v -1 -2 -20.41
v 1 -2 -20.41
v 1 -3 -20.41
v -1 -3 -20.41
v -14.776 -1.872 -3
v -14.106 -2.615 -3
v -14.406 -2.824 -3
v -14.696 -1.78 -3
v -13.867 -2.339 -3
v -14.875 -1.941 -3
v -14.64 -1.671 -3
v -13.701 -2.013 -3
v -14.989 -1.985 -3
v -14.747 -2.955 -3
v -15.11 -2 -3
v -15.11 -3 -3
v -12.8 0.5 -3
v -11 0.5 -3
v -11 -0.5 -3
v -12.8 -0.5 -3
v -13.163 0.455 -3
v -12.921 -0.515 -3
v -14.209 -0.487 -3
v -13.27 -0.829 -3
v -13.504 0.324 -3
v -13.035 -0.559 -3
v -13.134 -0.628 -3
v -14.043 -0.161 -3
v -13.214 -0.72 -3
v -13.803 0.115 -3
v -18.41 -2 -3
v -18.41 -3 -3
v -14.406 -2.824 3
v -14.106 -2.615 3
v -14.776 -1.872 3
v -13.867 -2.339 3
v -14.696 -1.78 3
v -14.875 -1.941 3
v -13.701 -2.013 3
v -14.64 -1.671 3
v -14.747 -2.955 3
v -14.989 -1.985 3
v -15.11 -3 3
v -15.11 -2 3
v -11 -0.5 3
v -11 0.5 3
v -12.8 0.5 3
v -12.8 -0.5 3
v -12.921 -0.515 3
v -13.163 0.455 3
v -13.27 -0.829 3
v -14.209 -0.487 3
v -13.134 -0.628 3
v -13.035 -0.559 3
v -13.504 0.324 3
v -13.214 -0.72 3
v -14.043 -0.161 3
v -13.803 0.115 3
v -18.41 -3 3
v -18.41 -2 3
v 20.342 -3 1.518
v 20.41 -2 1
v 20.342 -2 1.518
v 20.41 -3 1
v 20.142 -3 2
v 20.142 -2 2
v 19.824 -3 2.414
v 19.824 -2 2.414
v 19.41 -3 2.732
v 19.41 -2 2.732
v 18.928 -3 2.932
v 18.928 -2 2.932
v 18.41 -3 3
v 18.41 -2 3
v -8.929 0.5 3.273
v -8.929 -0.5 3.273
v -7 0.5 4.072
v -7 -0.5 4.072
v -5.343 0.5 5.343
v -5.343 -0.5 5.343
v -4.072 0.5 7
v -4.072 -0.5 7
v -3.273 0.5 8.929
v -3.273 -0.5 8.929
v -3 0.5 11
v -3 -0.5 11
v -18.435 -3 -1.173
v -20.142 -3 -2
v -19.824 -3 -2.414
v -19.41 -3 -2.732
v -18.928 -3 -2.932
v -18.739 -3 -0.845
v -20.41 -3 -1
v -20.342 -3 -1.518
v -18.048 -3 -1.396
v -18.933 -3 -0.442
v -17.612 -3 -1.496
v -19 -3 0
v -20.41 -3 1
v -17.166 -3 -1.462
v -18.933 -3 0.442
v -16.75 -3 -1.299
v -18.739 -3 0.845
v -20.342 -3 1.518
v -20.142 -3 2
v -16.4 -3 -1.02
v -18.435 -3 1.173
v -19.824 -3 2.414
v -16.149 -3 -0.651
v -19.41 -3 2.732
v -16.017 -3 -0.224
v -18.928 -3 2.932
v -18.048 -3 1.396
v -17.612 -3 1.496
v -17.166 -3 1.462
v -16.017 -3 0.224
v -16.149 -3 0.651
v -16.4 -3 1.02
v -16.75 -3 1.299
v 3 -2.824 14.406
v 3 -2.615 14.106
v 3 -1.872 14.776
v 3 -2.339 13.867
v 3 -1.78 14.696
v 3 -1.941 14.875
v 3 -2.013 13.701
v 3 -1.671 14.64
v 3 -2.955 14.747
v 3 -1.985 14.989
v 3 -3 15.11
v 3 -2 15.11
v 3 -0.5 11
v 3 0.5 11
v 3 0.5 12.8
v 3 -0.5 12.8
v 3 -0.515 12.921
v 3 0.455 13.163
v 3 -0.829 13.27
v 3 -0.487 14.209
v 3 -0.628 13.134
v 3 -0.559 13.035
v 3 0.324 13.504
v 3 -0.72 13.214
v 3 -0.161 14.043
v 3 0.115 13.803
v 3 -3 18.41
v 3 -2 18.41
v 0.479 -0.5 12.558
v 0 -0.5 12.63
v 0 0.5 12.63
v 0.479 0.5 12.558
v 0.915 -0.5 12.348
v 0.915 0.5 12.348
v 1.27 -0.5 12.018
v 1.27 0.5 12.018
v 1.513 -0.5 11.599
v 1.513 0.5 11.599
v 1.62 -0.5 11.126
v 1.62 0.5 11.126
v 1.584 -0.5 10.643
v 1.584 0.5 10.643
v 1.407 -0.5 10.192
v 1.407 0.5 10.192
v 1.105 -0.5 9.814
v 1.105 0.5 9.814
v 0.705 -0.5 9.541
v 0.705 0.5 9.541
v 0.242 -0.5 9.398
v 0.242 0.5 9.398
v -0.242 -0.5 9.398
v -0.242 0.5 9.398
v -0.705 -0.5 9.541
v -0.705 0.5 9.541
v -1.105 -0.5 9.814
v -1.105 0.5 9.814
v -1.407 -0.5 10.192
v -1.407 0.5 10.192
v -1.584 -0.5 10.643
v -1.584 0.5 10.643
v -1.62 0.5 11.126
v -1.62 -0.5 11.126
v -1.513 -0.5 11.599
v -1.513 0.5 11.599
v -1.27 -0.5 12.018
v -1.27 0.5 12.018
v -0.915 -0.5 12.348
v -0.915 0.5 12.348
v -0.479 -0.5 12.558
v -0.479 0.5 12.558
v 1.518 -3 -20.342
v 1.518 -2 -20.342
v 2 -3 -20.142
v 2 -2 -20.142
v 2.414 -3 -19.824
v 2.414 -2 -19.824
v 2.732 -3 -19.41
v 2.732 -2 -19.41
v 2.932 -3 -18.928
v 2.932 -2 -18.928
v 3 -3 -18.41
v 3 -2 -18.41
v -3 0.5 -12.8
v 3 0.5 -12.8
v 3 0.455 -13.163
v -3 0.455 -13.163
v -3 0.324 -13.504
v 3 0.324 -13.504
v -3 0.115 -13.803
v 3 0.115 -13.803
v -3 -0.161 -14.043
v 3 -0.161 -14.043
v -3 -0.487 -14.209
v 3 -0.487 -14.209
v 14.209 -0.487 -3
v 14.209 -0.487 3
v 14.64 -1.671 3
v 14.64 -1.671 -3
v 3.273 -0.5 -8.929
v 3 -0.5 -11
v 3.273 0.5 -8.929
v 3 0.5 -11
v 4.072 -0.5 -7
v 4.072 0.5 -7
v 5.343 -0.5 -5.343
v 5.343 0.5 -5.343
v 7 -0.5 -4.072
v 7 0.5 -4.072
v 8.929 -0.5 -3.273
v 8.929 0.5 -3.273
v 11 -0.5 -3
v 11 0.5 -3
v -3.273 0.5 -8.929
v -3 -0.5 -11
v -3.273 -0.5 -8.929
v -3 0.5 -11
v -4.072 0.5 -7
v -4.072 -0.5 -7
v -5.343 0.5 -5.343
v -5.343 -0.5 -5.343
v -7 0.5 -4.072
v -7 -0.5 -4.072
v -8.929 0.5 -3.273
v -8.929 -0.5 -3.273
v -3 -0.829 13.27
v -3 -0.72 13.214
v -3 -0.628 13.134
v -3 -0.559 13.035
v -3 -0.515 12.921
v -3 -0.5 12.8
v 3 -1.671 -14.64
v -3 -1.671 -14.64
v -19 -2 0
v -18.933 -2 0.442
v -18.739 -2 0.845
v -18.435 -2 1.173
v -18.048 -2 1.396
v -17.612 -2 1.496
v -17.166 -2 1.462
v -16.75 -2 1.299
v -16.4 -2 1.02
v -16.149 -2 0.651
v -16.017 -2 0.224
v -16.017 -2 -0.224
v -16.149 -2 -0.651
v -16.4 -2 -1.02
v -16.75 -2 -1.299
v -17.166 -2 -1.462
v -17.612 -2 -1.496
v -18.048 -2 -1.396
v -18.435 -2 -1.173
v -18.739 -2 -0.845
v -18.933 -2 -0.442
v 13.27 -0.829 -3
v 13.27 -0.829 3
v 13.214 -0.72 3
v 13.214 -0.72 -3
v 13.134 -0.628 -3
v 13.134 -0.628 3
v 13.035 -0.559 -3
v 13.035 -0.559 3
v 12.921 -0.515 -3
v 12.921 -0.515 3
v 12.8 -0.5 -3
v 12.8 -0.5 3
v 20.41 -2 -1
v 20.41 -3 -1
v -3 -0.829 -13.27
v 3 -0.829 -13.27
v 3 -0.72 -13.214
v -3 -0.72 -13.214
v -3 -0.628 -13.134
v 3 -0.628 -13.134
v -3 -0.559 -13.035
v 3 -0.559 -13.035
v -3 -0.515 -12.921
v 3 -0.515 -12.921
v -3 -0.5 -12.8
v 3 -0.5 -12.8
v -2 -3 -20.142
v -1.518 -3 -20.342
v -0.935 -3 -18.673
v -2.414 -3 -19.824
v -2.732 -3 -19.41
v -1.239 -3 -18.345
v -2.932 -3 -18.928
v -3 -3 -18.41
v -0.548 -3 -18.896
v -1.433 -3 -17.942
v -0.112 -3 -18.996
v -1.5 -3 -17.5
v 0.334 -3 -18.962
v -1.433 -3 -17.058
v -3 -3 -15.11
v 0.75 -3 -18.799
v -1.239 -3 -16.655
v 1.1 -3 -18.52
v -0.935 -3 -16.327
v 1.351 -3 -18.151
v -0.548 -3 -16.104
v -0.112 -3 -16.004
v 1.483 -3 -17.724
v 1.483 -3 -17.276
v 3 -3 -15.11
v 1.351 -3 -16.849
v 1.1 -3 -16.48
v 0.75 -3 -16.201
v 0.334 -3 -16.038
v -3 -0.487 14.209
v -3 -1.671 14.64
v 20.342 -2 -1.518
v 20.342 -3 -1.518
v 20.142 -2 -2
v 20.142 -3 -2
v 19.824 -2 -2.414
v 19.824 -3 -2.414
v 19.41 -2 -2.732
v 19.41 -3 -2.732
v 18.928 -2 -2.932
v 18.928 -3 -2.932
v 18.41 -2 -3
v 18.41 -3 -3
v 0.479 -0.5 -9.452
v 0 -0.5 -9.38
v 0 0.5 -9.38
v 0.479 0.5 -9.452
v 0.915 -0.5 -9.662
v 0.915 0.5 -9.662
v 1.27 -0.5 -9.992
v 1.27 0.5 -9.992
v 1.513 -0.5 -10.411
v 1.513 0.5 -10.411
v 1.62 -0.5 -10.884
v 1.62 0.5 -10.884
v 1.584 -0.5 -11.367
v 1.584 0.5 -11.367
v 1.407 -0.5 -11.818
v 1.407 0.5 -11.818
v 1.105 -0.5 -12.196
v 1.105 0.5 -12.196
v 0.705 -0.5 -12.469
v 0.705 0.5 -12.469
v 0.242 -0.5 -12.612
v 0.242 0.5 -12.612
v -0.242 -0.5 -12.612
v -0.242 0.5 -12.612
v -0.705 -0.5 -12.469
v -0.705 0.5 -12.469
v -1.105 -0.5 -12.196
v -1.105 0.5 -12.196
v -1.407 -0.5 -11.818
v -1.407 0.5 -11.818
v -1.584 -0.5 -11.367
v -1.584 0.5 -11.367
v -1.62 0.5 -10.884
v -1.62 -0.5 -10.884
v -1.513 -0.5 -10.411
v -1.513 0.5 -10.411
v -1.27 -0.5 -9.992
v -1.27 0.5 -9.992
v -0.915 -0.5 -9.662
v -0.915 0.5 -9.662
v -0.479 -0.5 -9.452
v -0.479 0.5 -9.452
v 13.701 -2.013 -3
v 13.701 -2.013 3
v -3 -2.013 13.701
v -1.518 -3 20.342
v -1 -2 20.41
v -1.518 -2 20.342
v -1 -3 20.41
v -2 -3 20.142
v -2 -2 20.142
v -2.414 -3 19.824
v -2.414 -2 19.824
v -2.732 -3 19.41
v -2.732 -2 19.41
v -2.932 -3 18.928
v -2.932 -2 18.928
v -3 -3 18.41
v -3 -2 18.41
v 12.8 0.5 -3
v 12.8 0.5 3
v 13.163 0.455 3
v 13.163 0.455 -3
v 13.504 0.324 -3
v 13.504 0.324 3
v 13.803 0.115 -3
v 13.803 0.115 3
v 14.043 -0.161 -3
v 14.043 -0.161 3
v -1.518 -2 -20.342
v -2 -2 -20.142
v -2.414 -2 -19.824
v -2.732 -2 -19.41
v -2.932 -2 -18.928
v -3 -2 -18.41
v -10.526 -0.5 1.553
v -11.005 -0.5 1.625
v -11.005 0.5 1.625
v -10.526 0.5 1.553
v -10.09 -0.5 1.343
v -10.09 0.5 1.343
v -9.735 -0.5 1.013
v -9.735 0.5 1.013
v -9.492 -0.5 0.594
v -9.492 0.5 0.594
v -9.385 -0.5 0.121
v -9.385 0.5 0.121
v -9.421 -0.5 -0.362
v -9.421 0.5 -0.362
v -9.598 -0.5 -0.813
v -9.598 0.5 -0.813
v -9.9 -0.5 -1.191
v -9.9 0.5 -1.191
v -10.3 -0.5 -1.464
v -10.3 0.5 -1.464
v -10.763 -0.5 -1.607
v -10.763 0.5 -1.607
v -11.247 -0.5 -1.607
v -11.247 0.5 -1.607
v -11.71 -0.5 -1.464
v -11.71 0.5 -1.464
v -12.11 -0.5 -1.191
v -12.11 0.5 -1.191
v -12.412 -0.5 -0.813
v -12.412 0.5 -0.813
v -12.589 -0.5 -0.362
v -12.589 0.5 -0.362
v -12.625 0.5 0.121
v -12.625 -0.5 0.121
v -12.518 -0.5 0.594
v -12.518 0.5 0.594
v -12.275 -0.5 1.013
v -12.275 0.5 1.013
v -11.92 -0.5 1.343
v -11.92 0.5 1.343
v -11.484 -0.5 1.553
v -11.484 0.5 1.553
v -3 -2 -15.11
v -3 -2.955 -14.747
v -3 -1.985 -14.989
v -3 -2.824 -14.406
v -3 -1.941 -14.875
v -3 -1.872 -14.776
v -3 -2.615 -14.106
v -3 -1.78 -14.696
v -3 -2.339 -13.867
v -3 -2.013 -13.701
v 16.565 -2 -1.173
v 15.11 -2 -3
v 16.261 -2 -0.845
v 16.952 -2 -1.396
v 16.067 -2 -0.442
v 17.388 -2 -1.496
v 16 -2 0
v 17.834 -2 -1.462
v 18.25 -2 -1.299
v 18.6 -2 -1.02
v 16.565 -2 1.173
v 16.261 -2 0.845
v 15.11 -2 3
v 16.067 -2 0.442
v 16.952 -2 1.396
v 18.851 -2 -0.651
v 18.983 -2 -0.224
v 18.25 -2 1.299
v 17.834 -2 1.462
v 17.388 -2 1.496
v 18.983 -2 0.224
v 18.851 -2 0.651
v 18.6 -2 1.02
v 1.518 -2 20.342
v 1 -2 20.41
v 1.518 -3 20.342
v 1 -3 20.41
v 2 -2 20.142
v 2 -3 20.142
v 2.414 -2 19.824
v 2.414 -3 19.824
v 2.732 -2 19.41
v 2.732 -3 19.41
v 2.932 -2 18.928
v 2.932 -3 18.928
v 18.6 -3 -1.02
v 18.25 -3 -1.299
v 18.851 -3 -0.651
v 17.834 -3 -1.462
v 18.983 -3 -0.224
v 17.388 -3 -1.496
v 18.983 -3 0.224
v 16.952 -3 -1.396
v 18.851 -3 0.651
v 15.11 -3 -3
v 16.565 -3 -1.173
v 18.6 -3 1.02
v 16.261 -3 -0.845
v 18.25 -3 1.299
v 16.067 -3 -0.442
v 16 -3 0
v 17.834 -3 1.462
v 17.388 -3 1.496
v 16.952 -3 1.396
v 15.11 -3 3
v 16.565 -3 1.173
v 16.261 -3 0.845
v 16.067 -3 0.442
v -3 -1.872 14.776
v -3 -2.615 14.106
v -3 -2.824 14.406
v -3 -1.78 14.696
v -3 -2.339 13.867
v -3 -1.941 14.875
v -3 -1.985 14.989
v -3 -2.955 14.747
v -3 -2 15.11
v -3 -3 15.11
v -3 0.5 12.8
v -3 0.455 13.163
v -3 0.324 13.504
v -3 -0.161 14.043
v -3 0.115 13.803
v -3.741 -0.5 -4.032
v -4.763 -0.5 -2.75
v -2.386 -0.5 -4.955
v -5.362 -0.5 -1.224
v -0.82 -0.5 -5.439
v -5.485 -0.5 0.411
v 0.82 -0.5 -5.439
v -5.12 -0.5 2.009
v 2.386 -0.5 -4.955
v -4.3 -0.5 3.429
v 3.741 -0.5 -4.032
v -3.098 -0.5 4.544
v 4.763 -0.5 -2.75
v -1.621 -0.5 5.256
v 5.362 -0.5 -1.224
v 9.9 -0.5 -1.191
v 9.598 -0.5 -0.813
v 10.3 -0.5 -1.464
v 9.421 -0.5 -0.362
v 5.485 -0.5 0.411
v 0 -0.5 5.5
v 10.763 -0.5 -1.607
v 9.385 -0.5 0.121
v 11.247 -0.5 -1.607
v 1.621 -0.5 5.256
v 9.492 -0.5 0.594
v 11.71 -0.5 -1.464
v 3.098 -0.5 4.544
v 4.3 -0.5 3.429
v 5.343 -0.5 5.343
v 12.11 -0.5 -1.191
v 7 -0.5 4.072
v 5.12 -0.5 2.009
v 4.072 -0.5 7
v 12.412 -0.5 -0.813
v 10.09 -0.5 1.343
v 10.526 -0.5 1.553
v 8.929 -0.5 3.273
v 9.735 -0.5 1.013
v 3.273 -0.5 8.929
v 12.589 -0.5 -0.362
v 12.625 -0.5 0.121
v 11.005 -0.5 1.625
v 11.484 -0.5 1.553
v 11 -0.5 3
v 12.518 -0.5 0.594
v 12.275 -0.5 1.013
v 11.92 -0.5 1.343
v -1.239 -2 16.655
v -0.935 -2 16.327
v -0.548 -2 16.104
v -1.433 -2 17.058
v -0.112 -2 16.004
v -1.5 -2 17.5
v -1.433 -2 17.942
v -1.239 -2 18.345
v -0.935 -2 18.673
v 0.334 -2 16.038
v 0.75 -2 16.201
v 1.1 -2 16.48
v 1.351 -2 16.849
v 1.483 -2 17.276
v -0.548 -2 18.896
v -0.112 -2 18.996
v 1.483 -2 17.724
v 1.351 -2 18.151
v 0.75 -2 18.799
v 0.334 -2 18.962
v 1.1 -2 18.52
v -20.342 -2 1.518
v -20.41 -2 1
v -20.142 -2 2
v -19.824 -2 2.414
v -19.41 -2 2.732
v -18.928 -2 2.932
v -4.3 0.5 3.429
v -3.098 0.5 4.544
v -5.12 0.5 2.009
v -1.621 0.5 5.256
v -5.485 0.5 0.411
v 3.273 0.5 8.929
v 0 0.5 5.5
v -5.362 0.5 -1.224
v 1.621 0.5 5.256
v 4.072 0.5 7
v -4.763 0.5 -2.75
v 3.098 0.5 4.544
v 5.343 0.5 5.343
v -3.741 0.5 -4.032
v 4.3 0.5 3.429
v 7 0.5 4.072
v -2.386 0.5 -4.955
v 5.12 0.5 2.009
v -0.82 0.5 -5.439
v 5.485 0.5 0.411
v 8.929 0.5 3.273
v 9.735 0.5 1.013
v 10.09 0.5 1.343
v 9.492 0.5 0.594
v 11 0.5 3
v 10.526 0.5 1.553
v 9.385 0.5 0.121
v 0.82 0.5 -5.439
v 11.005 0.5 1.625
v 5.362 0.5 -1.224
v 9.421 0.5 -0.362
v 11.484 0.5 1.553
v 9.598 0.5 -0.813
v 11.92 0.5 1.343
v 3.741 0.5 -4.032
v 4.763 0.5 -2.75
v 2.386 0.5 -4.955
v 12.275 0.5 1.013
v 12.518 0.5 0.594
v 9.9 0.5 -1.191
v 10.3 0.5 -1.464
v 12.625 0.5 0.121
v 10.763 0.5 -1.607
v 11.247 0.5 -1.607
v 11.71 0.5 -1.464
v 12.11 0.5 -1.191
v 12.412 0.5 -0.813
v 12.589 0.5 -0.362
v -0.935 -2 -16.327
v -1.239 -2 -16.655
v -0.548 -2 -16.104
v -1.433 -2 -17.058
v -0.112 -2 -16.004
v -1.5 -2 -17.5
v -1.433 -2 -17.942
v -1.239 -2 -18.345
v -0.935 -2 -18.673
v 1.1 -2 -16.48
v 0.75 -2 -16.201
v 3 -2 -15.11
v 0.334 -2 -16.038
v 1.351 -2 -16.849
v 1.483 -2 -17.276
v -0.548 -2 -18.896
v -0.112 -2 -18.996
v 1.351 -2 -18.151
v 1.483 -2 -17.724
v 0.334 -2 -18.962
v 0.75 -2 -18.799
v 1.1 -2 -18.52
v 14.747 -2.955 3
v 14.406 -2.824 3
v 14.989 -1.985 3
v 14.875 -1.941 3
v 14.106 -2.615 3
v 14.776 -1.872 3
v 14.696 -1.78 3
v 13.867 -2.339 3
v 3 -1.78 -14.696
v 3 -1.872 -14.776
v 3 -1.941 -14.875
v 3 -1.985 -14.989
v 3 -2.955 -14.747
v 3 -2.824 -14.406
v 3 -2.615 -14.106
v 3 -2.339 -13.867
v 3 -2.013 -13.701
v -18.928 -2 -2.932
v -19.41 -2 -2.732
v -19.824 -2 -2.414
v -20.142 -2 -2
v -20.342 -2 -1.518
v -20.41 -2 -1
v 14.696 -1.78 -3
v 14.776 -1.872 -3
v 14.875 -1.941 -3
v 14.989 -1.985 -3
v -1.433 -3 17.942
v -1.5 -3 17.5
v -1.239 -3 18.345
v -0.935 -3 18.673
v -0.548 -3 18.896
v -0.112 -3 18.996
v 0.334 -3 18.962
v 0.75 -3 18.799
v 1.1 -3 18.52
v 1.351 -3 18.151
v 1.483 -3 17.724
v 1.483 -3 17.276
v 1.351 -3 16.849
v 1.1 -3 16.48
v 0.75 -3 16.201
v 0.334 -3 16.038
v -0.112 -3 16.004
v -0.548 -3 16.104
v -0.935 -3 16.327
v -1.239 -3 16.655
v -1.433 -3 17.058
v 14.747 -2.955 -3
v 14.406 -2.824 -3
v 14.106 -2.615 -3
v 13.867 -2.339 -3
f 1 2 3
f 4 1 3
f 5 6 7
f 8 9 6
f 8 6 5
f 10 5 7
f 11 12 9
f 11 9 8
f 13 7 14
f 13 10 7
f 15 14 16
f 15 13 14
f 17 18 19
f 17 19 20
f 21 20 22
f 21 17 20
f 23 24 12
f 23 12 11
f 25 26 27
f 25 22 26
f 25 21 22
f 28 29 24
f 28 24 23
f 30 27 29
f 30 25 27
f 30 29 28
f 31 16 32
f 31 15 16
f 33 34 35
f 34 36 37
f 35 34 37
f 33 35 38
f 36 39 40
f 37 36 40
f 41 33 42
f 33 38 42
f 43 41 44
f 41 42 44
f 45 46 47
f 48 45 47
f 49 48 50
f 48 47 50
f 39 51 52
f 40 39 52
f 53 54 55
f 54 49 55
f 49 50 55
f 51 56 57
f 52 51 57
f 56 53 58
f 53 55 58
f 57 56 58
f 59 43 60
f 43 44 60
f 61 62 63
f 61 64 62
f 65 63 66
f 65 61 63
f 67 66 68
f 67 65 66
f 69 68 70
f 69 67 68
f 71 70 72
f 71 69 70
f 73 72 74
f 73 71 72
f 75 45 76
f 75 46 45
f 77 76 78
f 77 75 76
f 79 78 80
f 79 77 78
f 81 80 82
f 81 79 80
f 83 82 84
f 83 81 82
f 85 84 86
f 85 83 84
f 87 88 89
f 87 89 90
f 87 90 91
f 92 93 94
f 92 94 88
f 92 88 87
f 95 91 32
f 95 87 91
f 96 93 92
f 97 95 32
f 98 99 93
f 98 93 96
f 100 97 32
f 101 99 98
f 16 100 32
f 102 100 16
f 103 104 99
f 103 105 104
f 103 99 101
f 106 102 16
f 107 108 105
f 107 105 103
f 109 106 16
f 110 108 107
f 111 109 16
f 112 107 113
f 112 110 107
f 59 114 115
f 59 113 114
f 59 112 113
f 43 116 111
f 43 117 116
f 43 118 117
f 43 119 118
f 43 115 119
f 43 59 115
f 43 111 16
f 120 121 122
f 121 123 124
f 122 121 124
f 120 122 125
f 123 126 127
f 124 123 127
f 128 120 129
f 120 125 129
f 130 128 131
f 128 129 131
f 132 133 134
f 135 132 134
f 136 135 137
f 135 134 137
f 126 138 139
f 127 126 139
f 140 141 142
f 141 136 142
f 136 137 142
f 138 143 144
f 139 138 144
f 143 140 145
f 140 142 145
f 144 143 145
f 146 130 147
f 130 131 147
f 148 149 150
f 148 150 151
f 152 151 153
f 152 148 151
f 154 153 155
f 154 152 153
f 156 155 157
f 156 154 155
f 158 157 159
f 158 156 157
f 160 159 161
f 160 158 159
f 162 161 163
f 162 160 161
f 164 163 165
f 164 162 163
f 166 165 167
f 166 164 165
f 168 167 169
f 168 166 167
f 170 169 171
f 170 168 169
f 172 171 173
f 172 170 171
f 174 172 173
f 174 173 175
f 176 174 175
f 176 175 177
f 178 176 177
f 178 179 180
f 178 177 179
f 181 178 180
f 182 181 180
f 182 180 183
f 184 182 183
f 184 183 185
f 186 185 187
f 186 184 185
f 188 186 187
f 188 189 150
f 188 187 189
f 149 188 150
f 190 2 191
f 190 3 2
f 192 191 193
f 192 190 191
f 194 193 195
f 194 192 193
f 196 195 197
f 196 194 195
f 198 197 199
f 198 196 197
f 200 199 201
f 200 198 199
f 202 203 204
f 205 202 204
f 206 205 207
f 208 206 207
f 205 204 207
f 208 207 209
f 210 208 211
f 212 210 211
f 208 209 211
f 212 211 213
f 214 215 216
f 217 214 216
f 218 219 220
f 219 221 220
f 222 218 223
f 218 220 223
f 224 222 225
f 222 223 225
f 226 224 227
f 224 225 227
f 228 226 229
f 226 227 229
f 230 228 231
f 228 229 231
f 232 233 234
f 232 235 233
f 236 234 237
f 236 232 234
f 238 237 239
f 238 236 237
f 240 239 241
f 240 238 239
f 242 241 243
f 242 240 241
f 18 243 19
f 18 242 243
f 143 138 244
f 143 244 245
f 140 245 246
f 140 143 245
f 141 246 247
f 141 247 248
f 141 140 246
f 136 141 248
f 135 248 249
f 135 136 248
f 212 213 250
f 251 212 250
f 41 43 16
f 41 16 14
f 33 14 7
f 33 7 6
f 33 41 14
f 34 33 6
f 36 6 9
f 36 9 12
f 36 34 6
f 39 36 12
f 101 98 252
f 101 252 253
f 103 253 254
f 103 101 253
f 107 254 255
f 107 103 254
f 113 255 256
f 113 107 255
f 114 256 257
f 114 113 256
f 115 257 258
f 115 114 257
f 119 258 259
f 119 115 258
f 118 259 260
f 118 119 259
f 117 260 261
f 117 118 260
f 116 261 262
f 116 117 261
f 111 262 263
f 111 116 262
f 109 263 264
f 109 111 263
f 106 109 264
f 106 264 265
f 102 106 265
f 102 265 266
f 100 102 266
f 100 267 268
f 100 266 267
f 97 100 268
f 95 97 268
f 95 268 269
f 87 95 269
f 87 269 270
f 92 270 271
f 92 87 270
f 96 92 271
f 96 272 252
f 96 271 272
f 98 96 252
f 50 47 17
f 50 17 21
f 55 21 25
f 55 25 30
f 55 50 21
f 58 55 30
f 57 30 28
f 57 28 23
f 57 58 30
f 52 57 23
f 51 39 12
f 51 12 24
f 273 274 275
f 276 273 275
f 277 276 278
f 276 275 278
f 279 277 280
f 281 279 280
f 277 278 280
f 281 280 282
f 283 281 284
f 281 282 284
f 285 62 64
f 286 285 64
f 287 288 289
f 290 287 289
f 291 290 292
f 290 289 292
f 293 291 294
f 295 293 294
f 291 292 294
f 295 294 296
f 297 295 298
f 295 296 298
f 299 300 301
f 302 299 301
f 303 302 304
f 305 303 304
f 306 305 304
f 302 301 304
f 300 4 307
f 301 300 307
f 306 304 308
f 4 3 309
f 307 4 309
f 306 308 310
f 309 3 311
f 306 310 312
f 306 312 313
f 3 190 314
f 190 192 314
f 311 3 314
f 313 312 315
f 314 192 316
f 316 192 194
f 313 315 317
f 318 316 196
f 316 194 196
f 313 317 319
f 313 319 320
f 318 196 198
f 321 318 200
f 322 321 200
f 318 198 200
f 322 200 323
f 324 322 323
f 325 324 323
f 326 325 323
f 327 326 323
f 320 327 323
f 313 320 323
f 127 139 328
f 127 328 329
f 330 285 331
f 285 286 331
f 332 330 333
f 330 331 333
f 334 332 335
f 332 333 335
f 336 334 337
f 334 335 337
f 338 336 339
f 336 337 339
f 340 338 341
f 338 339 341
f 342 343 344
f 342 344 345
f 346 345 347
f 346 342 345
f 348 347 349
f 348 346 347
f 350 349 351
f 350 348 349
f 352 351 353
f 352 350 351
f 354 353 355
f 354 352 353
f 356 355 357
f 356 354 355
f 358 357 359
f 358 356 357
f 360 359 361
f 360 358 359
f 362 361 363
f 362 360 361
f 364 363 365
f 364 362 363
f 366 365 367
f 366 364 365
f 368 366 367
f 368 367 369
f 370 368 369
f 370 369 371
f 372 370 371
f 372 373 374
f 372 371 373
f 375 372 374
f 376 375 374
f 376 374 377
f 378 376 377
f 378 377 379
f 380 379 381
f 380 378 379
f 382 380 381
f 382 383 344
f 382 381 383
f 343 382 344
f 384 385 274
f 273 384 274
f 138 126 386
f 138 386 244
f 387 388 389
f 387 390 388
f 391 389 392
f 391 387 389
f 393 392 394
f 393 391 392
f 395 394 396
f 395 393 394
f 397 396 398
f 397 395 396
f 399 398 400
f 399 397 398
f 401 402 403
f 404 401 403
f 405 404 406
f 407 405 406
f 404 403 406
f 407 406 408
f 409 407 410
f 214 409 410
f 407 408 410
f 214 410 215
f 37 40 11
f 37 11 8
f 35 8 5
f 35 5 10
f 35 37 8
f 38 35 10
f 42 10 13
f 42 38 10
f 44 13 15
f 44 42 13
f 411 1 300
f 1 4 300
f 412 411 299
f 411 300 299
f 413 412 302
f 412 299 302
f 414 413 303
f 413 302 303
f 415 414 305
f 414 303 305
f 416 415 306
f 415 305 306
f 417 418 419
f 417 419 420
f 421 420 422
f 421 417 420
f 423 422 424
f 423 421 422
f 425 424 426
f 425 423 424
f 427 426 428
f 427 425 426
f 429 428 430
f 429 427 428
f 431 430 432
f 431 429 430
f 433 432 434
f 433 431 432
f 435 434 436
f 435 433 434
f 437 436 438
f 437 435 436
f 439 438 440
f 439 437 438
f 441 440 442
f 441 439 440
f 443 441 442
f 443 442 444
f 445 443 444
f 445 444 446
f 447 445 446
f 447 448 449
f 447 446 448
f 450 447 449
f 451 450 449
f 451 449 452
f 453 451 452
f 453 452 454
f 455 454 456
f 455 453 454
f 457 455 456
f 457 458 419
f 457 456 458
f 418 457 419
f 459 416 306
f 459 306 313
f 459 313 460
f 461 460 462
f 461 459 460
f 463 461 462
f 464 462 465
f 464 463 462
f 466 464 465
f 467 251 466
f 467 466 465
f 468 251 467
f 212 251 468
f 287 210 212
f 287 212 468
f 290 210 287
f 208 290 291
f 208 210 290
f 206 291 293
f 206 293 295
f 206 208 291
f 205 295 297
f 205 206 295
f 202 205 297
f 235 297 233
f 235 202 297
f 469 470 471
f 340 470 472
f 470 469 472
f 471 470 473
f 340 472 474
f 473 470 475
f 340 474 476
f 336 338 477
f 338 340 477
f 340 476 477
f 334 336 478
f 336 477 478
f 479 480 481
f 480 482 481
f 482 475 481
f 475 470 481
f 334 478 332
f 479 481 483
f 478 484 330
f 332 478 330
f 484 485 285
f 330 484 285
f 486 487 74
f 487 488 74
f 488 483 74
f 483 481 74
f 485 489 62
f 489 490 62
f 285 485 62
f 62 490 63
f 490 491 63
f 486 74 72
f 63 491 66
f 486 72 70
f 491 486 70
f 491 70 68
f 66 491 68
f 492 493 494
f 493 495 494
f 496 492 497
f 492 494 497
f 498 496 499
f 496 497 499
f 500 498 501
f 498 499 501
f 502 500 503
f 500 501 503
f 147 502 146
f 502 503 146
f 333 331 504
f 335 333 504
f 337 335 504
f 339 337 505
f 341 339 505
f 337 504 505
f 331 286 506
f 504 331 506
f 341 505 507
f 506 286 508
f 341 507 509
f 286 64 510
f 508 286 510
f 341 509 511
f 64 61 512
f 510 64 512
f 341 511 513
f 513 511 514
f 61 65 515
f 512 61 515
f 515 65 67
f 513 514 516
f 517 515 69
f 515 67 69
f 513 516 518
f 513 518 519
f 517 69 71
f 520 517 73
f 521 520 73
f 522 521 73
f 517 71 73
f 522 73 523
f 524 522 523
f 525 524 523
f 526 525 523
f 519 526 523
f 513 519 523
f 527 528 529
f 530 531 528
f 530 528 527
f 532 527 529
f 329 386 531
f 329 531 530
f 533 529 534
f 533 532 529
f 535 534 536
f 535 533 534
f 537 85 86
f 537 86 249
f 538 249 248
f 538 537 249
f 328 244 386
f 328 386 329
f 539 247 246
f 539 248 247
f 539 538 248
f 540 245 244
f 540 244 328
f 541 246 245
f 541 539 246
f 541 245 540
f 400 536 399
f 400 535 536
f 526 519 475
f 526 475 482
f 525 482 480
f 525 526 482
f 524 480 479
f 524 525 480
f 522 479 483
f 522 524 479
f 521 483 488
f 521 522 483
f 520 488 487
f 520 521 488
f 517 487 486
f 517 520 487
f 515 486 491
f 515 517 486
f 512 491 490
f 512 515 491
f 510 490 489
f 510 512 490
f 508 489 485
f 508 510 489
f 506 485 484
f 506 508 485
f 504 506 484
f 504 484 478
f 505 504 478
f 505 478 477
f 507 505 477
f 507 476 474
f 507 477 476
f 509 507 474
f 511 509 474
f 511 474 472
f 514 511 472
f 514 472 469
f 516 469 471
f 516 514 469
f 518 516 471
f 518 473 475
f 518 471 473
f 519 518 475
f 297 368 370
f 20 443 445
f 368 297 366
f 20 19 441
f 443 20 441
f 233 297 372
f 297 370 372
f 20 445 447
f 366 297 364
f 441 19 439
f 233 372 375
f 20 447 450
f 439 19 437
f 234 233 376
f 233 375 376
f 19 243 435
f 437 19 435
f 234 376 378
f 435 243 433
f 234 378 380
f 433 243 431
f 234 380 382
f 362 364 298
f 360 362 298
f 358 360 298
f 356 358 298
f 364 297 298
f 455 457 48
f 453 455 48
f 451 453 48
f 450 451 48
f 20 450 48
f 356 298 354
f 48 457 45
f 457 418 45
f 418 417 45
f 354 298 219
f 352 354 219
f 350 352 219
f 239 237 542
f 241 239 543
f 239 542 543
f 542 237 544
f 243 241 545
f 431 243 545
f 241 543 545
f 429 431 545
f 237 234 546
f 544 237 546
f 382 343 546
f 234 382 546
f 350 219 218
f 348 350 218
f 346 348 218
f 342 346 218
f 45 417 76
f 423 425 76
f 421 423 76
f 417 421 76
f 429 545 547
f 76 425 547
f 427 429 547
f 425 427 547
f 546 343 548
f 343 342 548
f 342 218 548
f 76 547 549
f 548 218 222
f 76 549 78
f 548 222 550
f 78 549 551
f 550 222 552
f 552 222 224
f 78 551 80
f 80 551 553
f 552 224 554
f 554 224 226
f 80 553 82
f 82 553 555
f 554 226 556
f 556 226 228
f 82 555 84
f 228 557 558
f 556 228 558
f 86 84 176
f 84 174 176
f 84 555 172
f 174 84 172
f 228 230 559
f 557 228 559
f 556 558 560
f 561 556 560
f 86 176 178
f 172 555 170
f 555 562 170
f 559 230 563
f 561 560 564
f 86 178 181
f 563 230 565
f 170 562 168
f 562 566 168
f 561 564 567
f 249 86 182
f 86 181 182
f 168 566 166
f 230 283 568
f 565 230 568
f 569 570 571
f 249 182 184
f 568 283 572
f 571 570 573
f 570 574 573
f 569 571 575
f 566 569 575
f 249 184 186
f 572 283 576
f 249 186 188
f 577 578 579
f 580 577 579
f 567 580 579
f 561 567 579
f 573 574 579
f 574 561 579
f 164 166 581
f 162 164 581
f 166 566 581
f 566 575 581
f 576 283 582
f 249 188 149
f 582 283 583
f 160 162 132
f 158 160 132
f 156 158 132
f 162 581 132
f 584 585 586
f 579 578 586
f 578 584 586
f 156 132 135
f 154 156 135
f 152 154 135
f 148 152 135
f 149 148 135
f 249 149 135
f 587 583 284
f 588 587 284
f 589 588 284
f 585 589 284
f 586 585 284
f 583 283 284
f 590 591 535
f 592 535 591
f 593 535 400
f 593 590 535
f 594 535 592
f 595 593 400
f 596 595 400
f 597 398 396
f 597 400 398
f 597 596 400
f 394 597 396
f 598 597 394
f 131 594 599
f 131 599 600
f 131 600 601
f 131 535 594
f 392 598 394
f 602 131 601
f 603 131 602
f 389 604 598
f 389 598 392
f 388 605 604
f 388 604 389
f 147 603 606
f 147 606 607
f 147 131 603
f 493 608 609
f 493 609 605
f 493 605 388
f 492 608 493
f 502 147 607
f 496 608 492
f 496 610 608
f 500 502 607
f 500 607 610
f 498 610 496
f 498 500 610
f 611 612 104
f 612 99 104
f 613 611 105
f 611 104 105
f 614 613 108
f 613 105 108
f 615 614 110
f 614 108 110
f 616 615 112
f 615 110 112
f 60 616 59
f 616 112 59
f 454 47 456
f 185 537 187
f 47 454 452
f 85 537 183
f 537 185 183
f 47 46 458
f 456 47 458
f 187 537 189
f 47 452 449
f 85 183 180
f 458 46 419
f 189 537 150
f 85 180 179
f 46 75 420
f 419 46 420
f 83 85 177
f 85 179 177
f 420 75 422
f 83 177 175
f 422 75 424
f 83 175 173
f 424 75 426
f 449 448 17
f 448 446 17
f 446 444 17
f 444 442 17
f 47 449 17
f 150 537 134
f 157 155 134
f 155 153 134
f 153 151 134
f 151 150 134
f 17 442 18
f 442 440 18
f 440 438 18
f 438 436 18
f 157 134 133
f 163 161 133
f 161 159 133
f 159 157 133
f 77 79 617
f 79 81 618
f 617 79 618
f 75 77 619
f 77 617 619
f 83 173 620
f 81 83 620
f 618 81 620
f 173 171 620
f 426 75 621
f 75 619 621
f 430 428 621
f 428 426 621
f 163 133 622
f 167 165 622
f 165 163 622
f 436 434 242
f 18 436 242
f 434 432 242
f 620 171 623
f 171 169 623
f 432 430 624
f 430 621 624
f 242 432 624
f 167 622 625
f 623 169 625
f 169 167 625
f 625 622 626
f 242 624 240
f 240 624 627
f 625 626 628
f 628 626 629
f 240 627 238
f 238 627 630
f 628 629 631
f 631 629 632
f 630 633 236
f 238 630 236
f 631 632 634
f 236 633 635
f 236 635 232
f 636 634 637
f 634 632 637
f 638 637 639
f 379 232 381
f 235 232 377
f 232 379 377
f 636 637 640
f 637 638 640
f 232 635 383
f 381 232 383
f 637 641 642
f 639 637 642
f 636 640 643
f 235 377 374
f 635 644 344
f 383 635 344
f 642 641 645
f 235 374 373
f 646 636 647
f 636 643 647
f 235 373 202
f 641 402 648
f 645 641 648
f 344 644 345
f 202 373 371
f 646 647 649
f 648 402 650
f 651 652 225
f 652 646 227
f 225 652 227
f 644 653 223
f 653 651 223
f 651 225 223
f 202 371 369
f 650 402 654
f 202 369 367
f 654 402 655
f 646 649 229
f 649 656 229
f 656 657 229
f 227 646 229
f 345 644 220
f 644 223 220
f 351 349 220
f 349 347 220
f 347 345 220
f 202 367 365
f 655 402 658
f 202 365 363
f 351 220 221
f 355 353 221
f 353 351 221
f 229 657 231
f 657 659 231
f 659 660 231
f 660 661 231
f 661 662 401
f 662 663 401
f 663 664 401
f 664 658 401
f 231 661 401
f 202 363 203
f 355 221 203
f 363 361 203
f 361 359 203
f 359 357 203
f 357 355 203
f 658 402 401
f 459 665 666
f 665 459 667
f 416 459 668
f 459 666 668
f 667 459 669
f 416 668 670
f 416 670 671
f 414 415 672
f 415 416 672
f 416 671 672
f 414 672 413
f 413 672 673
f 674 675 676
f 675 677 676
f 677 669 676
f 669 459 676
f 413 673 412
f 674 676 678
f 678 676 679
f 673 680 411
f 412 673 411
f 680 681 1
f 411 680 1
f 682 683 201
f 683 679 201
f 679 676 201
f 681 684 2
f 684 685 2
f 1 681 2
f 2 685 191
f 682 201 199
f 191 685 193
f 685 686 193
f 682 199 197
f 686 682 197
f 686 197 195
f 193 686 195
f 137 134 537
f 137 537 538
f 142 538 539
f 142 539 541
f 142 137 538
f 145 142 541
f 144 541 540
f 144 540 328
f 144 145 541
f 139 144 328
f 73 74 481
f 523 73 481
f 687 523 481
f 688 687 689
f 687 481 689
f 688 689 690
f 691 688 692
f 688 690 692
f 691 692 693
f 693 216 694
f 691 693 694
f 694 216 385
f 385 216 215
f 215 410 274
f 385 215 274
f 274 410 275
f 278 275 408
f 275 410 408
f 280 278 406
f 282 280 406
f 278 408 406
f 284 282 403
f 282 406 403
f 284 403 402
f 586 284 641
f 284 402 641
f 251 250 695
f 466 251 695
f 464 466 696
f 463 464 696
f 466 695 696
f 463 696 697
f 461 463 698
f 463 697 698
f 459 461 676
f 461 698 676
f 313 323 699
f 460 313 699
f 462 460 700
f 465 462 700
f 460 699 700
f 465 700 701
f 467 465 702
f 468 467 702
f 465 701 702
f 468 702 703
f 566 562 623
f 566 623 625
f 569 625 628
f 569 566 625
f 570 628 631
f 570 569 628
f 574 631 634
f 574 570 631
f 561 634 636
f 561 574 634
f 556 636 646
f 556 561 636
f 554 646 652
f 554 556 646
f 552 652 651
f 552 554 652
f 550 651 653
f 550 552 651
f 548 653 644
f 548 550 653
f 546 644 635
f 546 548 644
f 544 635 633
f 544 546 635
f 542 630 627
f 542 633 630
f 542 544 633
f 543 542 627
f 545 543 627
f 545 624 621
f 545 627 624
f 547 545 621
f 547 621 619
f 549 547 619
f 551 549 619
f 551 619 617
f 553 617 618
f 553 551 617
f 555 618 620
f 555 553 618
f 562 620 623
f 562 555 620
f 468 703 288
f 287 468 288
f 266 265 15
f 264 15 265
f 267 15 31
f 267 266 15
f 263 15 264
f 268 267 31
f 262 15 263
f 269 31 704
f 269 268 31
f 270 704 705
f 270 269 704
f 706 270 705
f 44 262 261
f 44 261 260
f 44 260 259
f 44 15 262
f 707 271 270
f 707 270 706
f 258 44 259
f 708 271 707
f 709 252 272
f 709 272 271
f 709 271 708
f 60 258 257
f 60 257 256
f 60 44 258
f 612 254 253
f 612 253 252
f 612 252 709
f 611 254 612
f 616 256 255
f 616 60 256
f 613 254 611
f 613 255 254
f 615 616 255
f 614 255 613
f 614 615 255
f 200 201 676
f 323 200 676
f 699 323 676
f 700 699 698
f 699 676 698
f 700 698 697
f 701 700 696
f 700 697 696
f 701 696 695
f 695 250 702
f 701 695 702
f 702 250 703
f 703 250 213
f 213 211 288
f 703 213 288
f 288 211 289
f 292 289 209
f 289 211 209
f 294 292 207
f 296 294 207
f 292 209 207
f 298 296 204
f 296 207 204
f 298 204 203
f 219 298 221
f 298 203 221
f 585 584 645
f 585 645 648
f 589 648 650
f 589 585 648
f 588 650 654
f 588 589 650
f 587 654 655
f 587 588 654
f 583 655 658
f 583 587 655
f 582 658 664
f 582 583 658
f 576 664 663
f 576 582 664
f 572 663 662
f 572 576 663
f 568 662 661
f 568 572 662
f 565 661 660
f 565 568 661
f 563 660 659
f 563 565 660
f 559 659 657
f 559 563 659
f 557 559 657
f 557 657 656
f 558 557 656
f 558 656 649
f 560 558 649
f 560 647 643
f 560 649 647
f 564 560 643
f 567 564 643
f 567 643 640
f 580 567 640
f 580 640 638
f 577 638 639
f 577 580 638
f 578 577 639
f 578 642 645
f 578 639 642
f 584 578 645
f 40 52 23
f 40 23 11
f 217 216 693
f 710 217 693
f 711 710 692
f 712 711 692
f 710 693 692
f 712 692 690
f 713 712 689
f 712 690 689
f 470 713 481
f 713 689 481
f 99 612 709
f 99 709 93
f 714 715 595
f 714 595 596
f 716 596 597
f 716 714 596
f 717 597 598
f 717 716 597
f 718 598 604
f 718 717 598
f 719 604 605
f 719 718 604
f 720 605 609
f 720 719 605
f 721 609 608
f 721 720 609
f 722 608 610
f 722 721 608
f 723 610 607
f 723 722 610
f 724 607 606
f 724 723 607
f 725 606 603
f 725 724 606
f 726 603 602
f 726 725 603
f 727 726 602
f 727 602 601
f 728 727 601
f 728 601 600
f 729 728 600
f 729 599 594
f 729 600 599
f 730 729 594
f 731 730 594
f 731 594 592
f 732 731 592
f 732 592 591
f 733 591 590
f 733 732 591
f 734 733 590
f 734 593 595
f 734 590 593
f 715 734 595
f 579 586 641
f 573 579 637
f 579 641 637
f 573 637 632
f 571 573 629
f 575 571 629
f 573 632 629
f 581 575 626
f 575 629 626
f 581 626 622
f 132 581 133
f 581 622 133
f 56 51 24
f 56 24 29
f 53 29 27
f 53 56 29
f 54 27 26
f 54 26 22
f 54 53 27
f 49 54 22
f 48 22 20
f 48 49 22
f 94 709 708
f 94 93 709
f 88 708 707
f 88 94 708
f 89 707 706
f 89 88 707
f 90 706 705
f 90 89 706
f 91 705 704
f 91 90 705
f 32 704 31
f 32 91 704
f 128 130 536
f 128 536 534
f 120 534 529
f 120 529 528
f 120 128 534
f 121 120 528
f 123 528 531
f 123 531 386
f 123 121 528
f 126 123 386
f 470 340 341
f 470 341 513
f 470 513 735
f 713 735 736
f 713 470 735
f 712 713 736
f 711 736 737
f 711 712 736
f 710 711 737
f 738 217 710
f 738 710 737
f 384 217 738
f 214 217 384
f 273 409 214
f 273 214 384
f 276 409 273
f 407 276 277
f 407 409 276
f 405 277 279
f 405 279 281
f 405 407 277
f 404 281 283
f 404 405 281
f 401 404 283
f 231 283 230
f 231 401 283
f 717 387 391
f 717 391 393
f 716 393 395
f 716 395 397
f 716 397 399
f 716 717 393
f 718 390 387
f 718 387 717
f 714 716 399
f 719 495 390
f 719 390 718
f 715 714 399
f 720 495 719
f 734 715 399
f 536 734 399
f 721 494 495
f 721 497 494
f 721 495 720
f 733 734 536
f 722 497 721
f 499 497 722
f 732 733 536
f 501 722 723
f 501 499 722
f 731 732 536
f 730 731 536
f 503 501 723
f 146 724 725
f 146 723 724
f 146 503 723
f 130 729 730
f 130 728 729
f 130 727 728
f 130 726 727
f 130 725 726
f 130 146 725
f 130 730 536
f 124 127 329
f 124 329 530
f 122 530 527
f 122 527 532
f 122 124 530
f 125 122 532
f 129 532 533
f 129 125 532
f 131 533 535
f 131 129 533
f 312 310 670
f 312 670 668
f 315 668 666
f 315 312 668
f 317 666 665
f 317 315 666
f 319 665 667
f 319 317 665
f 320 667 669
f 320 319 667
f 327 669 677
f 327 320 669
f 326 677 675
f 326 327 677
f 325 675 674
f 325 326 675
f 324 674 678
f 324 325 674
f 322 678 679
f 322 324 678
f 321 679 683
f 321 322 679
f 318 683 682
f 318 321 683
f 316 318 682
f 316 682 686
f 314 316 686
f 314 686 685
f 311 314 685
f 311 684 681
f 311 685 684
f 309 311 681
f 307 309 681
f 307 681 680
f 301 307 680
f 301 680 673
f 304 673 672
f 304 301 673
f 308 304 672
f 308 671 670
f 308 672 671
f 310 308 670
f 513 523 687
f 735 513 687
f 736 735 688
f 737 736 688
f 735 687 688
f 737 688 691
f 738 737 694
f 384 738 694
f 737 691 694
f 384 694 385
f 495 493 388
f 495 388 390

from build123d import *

# Parameters (mm, degrees)
EXTRUDE_THIN1_DEPTH     = 3
FILLET1_R               = 2
FILLET1_OF_MIRROR1_R    = 2
CIRPATTERN1_COUNT       = 2
CIRPATTERN1_ANGLE       = 90
CUT_EXTRUDE1_DEPTH      = 30.075421318
CUT_EXTRUDE1_DEPTH_BACK = 30.075421318
SKETCH3_R               = 1.625
CUT_EXTRUDE2_DEPTH      = 29.972057656
CUT_EXTRUDE2_DEPTH_BACK = 29.972057656
SKETCH4_R               = 1.5
FILLET2_R               = 8
CUT_EXTRUDE3_DEPTH      = 30.075421318
CUT_EXTRUDE3_DEPTH_BACK = 30.075421318
SKETCH5_R               = 5.5


with BuildPart() as part:
    # Sketch1 → Extrude-Thin1 (new, symmetric)
    with BuildSketch(Plane.XY):
        with BuildLine():
            Line((-20.409925586, -3), (-15.110133124, -3))
            ThreePointArc((-15.110133124, -3), (-14.249768469, -2.728728066), (-13.700594193, -2.013030215))
            Line((-13.700594193, -2.013030215), (-13.269638772, -0.828989928))
            ThreePointArc((-13.269638772, -0.828989928), (-13.08658068, -0.590423978), (-12.799792462, -0.5))
            Line((-12.799792462, -0.5), (0, -0.5))
            Line((0, -0.5), (0, 0.5))
            Line((0, 0.5), (-12.799792462, 0.5))
            ThreePointArc((-12.799792462, 0.5), (-13.660157116, 0.228728066), (-14.209331393, -0.486969785))
            Line((-14.209331393, -0.486969785), (-14.640286813, -1.671010072))
            ThreePointArc((-14.640286813, -1.671010072), (-14.823344906, -1.909576022), (-15.110133124, -2))
            Line((-15.110133124, -2), (-20.409925586, -2))
            Line((-20.409925586, -2), (-20.409925586, -3))
        make_face()
    extrude_thin1 = extrude(amount=EXTRUDE_THIN1_DEPTH, both=True)

    # Fillet1
    fillet1_edges = [part.edges().sort_by_distance(p)[0] for p in [
        (-20.409925586, -2.5, -3),
        (-20.409925586, -2.5, 3),
    ]]
    fillet(fillet1_edges, radius=FILLET1_R)

    # Mirror1: Extrude-Thin1 across plane
    add(extrude_thin1.mirror(Plane(origin=(0, 0.5, 3), x_dir=(0, 0, 1), z_dir=(1, 0, 0))))

    # Fillet1 of Mirror1
    fillet1_of_mirror1_edges = [part.edges().sort_by_distance(p)[0] for p in [
        (20.409925586, -2.5, -3),
        (20.409925586, -2.5, 3),
    ]]
    fillet(fillet1_of_mirror1_edges, radius=FILLET1_OF_MIRROR1_R)


with BuildPart() as cirpattern1_1:
    # CirPattern1: pattern copy
    add(part.part.rotate(Axis((0, 0, 0), (0, 1, 0)), 1 * CIRPATTERN1_ANGLE / (CIRPATTERN1_COUNT - 1)))


with BuildPart() as cut_extrude1_tool:
    # Sketch3 → Cut-Extrude1 (new, two sides: drawn at the far end of the back side and taken through both)
    with BuildSketch(Plane(origin=(0, 0.5, 0), x_dir=(1, 0, 0), z_dir=(0, 1, 0)).offset(-CUT_EXTRUDE1_DEPTH_BACK)):
        with Locations(Location((11.005, 0, 0), (0, 0, 270))):
            Circle(SKETCH3_R)
        with Locations(Location((0, -11.005, 0), (0, 0, 270))):
            Circle(SKETCH3_R)
        with Locations(Location((-11.005, 0, 0), (0, 0, 270))):
            Circle(SKETCH3_R)
        with Locations(Location((0, 11.005, 0), (0, 0, 270))):
            Circle(SKETCH3_R)
    extrude(amount=CUT_EXTRUDE1_DEPTH + CUT_EXTRUDE1_DEPTH_BACK)


with BuildPart() as part_1:
    add(part.part)

    # Cut-Extrude1: cut by cut_extrude1_tool
    add(cut_extrude1_tool.part, mode=Mode.SUBTRACT)


with BuildPart() as cirpattern1_1_1:
    add(cirpattern1_1.part)

    # Cut-Extrude1: cut by cut_extrude1_tool
    add(cut_extrude1_tool.part, mode=Mode.SUBTRACT)


with BuildPart() as cut_extrude2_tool:
    # Sketch4 → Cut-Extrude2 (new, two sides: drawn at the far end of the back side and taken through both)
    with BuildSketch(Plane(origin=(0, -2, 0), x_dir=(1, 0, 0), z_dir=(0, 1, 0)).offset(-CUT_EXTRUDE2_DEPTH_BACK)):
        with Locations(Location((-17.5, 0, 0), (0, 0, 180))):
            Circle(SKETCH4_R)
        with Locations(Location((0, 17.5, 0), (0, 0, 180))):
            Circle(SKETCH4_R)
        with Locations(Location((17.5, 0, 0), (0, 0, 180))):
            Circle(SKETCH4_R)
        with Locations(Location((0, -17.5, 0), (0, 0, 180))):
            Circle(SKETCH4_R)
    extrude(amount=CUT_EXTRUDE2_DEPTH + CUT_EXTRUDE2_DEPTH_BACK)


with BuildPart() as part_2:
    add(part_1.part)

    # Cut-Extrude2: cut by cut_extrude2_tool
    add(cut_extrude2_tool.part, mode=Mode.SUBTRACT)


with BuildPart() as cirpattern1_1_2:
    add(cirpattern1_1_1.part)

    # Cut-Extrude2: cut by cut_extrude2_tool
    add(cut_extrude2_tool.part, mode=Mode.SUBTRACT)


with BuildPart() as part_3:
    add(part_2.part)

    # Combine2: union CirPattern1_1
    add(cirpattern1_1_2.part)

    # Fillet2
    fillet2_edges = [part_3.edges().sort_by_distance(p)[0] for p in [
        (-3, 0, -3),
        (3, 0, -3),
        (-3, 0, 3),
        (3, 0, 3),
    ]]
    fillet(fillet2_edges, radius=FILLET2_R)

    # Sketch5 → Cut-Extrude3 (cut, two sides: drawn at the far end of the back side and taken through both)
    with BuildSketch(Plane(origin=(0, 0.5, 0), x_dir=(1, 0, 0), z_dir=(0, 1, 0)).offset(-CUT_EXTRUDE3_DEPTH_BACK)):
        with Locations(Location((0, 0, 0), (0, 0, 270))):
            Circle(SKETCH5_R)
    extrude(amount=CUT_EXTRUDE3_DEPTH + CUT_EXTRUDE3_DEPTH_BACK, mode=Mode.SUBTRACT)


solid = part_3.part
